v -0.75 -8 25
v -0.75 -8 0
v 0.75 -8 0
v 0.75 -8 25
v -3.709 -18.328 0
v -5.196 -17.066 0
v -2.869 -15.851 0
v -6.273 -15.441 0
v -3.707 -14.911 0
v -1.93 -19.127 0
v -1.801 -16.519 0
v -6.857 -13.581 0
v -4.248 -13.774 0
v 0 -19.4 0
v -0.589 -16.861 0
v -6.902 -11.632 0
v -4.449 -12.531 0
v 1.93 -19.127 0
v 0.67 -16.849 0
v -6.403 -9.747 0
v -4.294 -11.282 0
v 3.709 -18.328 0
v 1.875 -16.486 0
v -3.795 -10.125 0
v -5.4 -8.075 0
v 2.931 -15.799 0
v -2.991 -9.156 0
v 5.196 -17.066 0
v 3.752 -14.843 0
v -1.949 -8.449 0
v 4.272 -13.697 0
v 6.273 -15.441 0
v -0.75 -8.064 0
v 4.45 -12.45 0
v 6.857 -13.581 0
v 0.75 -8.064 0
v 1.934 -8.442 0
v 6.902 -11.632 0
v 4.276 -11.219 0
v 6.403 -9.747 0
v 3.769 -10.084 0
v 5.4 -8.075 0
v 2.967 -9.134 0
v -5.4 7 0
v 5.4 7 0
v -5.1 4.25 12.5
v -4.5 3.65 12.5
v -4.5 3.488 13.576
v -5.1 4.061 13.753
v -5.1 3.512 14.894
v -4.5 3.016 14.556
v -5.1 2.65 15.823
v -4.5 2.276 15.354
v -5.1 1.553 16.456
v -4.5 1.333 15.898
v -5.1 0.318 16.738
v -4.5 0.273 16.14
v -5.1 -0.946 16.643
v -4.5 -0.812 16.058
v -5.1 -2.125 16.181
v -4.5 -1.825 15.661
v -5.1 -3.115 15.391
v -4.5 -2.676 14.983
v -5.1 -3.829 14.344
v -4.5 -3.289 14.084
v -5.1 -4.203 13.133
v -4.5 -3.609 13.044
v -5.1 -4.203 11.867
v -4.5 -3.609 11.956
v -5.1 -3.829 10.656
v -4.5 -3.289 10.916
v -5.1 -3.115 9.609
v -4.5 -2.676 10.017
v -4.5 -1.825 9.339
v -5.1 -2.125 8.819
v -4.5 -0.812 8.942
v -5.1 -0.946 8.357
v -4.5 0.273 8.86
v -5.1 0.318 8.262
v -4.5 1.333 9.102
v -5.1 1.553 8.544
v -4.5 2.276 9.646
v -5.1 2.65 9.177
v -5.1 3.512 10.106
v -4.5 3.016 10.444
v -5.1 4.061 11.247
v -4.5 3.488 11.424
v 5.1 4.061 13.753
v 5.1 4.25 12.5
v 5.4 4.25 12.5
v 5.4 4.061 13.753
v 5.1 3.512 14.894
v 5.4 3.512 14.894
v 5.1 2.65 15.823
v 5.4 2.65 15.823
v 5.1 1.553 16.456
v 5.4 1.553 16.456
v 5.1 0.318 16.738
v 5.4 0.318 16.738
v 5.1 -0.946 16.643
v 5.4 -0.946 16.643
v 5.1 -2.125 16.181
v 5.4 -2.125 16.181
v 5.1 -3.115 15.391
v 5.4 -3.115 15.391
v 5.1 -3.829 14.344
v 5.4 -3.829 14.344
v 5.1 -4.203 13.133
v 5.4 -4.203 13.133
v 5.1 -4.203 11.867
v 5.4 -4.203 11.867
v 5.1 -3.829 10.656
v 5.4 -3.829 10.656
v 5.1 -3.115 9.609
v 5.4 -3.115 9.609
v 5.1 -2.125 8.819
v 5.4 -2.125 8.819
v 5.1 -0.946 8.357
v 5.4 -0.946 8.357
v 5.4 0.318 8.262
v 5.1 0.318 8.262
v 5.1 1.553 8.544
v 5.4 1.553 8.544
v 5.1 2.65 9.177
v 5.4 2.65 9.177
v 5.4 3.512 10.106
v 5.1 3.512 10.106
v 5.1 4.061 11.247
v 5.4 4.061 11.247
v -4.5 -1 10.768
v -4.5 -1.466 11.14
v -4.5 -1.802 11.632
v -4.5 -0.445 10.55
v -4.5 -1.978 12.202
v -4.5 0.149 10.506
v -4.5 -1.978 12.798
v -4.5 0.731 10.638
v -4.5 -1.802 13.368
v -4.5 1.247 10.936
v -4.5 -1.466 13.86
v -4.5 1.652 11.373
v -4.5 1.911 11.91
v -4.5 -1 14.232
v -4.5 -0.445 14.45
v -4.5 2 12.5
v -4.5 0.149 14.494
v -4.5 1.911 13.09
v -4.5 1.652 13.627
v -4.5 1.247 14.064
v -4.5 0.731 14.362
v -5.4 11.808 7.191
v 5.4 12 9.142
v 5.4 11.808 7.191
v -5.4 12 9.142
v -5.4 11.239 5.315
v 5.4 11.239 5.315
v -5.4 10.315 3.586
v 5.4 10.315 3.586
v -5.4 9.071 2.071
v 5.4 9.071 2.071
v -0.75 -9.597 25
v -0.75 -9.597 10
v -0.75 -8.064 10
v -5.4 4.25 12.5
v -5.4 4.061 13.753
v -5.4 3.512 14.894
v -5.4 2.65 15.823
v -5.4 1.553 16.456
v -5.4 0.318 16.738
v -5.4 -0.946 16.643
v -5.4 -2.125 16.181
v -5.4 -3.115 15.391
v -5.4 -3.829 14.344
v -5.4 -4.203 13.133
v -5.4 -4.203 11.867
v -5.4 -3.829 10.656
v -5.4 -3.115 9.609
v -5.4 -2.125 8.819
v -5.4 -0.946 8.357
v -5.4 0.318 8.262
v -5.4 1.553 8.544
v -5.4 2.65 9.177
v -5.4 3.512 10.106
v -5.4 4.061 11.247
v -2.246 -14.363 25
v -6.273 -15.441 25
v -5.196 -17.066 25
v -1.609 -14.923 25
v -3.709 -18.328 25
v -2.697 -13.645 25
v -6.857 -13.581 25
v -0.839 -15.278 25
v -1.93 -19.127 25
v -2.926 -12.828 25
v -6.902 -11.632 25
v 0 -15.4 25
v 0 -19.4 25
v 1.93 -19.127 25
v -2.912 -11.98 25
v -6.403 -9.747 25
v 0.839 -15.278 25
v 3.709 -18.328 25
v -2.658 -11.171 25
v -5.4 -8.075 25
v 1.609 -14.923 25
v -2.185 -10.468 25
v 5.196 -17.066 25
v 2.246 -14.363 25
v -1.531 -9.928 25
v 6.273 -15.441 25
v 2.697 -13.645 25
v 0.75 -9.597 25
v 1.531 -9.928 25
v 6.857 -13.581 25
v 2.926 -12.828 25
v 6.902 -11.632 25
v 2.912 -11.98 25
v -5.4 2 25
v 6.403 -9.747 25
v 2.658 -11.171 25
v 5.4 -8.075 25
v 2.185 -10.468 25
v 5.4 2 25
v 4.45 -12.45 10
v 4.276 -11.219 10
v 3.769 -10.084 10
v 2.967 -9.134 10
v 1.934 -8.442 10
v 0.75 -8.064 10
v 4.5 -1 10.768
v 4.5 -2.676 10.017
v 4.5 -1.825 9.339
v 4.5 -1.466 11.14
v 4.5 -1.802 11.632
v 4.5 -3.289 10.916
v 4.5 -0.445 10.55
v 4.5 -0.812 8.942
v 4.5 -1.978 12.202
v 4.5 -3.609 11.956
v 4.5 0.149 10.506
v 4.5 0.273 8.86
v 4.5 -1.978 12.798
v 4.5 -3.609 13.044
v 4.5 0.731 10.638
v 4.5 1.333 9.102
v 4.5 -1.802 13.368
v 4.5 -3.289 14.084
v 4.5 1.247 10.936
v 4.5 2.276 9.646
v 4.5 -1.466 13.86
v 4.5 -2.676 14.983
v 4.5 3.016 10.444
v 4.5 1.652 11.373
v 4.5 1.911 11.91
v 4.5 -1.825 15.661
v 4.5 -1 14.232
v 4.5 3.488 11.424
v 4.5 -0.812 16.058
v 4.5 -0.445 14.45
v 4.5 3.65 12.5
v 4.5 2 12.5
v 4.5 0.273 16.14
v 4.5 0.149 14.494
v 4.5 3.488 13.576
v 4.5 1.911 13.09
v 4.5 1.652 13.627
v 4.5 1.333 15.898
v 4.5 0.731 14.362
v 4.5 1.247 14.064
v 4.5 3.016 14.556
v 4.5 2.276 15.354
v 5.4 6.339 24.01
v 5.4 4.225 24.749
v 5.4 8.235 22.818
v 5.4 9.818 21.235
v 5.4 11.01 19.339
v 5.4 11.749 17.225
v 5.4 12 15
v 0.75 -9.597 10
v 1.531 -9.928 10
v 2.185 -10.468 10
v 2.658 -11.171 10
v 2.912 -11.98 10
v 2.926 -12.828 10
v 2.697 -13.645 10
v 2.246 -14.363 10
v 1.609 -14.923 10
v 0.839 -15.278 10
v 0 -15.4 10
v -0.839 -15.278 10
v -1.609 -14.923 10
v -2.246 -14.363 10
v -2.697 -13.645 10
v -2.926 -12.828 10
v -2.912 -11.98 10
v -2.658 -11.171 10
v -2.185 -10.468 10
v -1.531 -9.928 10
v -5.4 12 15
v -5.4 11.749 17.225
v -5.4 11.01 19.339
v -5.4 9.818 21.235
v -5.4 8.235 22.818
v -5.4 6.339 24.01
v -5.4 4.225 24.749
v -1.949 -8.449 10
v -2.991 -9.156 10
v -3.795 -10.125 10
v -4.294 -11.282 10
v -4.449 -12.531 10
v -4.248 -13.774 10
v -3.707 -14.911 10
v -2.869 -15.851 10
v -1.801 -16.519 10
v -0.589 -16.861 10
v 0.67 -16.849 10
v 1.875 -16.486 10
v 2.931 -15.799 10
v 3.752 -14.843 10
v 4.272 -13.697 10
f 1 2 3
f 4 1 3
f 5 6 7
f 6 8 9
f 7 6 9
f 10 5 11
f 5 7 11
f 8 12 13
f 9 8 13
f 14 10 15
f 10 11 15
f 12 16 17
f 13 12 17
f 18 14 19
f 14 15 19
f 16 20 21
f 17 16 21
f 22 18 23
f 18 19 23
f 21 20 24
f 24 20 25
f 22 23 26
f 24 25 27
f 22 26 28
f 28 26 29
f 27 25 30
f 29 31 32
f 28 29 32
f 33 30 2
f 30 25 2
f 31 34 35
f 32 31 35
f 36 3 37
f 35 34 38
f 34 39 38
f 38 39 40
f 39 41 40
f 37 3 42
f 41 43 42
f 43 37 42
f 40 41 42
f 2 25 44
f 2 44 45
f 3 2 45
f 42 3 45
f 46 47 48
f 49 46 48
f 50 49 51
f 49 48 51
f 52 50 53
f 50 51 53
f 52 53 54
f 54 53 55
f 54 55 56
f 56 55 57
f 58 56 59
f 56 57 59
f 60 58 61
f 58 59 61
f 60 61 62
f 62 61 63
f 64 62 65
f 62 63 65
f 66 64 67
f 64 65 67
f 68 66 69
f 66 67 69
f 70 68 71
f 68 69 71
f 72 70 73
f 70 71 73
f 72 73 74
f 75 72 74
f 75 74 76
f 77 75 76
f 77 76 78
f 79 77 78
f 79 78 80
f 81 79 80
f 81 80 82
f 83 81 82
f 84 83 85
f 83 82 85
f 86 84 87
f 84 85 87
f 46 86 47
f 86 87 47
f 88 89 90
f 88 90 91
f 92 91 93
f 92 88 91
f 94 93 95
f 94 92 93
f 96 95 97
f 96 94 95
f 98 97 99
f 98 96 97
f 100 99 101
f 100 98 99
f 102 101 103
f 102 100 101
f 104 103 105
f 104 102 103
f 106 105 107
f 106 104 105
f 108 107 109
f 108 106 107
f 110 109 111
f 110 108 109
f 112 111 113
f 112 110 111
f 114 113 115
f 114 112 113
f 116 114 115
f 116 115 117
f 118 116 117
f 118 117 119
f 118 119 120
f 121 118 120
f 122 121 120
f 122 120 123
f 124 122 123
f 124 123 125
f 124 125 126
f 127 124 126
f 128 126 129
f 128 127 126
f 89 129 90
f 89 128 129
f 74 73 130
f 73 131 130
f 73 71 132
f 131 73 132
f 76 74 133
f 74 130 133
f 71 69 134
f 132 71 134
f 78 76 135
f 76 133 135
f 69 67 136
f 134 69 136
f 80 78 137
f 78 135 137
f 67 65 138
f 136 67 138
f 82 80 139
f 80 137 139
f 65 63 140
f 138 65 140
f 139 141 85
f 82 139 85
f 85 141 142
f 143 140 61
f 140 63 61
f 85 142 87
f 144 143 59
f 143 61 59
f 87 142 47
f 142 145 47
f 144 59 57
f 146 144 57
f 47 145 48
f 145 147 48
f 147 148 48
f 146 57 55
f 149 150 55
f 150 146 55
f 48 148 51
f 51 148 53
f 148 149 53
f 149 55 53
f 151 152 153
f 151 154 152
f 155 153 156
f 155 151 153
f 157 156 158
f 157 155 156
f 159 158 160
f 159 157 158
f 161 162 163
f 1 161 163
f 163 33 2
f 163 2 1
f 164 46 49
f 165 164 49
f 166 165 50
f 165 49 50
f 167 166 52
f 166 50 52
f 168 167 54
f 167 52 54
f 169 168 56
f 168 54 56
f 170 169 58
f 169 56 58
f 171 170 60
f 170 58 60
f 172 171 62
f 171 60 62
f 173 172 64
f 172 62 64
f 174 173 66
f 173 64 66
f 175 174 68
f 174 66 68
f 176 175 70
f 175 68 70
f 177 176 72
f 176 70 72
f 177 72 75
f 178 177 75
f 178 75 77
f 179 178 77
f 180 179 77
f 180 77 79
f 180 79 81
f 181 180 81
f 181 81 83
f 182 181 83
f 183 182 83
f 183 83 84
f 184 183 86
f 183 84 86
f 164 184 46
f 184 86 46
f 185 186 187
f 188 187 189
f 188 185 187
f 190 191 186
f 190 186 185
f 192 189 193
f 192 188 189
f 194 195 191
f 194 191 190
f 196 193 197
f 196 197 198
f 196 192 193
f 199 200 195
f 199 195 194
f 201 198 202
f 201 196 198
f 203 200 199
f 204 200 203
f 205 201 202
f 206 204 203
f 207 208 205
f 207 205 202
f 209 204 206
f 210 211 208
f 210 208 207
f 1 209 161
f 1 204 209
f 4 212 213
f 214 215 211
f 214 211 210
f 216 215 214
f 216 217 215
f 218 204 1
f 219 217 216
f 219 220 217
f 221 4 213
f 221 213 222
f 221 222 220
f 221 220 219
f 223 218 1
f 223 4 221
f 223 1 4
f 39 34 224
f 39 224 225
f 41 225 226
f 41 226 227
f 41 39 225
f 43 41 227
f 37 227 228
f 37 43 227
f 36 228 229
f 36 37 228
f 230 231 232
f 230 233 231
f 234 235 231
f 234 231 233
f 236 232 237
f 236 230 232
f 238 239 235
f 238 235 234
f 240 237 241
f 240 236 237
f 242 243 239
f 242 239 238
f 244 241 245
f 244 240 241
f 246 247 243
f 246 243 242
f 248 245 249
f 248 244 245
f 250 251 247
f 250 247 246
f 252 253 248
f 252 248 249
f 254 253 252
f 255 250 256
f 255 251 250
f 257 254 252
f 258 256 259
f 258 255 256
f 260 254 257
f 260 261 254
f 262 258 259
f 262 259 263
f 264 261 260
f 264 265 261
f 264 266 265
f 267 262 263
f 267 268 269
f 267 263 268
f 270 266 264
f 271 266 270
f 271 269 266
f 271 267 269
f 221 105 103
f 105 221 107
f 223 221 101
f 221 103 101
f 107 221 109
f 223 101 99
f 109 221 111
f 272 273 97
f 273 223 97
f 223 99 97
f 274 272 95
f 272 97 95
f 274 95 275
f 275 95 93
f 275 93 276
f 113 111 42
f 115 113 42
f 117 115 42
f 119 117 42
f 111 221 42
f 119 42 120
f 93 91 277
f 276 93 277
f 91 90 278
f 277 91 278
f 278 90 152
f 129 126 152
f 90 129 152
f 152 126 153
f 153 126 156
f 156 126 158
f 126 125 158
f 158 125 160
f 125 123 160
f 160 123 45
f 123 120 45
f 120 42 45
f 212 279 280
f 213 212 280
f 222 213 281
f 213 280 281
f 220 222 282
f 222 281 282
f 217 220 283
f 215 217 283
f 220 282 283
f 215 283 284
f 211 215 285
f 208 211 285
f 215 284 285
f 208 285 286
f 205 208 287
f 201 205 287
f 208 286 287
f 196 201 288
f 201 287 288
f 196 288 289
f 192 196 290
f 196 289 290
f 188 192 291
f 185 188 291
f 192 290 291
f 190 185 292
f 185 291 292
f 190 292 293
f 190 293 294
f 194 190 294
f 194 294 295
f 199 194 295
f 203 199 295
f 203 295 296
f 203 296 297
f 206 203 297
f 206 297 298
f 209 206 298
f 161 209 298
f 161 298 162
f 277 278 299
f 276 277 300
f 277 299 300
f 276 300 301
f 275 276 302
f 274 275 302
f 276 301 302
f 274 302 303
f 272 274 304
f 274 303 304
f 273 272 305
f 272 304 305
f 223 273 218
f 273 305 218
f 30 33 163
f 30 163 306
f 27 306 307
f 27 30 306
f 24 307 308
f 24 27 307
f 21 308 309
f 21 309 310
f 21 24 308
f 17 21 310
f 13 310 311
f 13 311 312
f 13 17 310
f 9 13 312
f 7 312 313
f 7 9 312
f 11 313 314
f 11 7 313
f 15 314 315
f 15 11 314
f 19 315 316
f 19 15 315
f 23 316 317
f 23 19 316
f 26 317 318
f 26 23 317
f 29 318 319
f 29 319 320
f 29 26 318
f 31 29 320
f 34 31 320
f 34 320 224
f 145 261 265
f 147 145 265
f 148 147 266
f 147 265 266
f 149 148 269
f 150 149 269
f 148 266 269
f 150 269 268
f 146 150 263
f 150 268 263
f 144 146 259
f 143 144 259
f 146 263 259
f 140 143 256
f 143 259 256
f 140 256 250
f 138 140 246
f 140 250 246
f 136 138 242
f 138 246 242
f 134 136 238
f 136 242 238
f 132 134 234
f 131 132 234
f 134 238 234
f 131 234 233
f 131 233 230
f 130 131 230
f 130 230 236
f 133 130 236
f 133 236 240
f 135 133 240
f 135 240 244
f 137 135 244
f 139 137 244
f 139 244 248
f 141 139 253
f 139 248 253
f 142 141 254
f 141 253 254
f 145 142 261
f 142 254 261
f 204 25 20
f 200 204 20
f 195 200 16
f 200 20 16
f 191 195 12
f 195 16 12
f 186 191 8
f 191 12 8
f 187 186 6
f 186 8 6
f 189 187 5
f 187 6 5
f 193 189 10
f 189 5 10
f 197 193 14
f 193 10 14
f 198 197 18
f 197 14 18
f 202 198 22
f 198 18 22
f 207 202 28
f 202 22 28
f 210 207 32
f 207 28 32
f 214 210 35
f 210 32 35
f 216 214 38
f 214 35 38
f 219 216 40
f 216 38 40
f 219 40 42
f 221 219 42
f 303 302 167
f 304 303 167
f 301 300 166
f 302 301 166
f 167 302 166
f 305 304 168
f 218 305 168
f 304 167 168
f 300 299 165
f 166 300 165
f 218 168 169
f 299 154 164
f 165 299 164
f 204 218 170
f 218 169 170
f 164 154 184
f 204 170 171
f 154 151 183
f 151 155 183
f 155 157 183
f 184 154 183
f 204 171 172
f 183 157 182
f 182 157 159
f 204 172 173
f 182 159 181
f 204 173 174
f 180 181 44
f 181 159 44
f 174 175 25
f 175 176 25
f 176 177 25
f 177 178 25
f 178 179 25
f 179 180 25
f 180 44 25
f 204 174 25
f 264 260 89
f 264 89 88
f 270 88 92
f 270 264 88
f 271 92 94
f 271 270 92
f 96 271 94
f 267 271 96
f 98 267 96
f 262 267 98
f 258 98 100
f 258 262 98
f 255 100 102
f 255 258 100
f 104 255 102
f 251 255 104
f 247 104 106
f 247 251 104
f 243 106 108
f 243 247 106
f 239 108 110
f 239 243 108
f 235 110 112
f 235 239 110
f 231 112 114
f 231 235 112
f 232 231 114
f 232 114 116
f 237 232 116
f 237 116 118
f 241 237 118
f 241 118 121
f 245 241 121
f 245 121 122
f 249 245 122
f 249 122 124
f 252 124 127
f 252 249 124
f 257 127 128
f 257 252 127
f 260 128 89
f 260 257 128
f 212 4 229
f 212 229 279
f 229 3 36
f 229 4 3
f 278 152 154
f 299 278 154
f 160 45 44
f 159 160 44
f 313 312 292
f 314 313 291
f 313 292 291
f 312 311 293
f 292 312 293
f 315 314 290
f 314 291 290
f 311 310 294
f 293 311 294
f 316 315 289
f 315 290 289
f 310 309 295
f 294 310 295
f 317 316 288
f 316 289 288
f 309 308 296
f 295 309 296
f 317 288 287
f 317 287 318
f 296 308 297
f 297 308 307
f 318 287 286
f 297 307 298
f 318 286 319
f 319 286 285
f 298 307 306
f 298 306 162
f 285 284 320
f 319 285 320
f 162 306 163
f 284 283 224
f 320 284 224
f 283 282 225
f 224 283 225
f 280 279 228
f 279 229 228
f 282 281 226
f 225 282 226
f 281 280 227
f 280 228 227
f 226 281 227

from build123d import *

# Parameters (mm, degrees)
F1_DEPTH = 25
F2_R     = 10
F3_R     = 2
F4_DEPTH = 12.5
F5_SIZE  = 5
F6_DEPTH = 10
F7_START = -4.5
F3_R_2   = 4.25
F7_DEPTH = 0.9
F8_START = 4.5
F8_DEPTH = 0.9
F9_SIZE  = 0.6
F10_R    = 10


with BuildPart() as f1:
    # F0 (on Top) → F1 (new body)
    with BuildSketch(Plane.XY):
        with BuildLine():
            Line((5.4, 12), (-5.4, 12))
            Line((-5.4, 12), (-5.4, 2))
            Line((-5.4, 2), (-5.4, -2))
            Line((-5.4, -2), (-5.4, -8.0747857195))
            ThreePointArc((-5.4, -8.0747857195), (0, -19.4), (5.4, -8.0747857195))
            Line((5.4, -8.0747857195), (5.4, -2))
            Line((5.4, -2), (5.4, 2))
            Line((5.4, 2), (5.4, 12))
        make_face()
        with BuildLine():
            ThreePointArc((4.45, -12.45), (-2.8692333471, -15.8514702703), (-0.75, -8.0636575601))
            Line((-0.75, -8.0636575601), (-0.75, -8))
            Line((-0.75, -8), (0, -8))
            Line((0, -8), (0.75, -8))
            Line((0.75, -8), (0.75, -8.0636575601))
            ThreePointArc((0.75, -8.0636575601), (3.4014702703, -9.5807666529), (4.45, -12.45))
        make_face(mode=Mode.SUBTRACT)
        with BuildLine():
            ThreePointArc((0.75, -9.5969314765), (0, -15.4), (-0.75, -9.5969314765))
            Line((-0.75, -9.5969314765), (-0.75, -8.0636575601))
            ThreePointArc((-0.75, -8.0636575601), (-2.8692333471, -15.8514702703), (4.45, -12.45))
            ThreePointArc((4.45, -12.45), (3.4014702703, -9.5807666529), (0.75, -8.0636575601))
            Line((0.75, -8.0636575601), (0.75, -9.5969314765))
        make_face()
    extrude(amount=F1_DEPTH)

    # F2
    f2_edges = [f1.edges().sort_by_distance(p)[0] for p in [
        (0, 12, 25),
    ]]
    fillet(f2_edges, radius=F2_R)

    # F3 (on Right) → F4 (cut, symmetric)
    with BuildSketch(Plane.YZ):
        with Locations((0, 12.5)):
            Circle(F3_R)
    extrude(amount=F4_DEPTH, both=True, mode=Mode.SUBTRACT)

    # F5
    f5_edges = [f1.edges().sort_by_distance(p)[0] for p in [
        (0, 12, 0),
    ]]
    chamfer(f5_edges, length=F5_SIZE)

    # F0 (on Top) → F6 (cut)
    with BuildSketch(Plane.XY):
        with BuildLine():
            ThreePointArc((0.75, -9.5969314765), (0, -15.4), (-0.75, -9.5969314765))
            Line((-0.75, -9.5969314765), (-0.75, -8.0636575601))
            ThreePointArc((-0.75, -8.0636575601), (-2.8692333471, -15.8514702703), (4.45, -12.45))
            ThreePointArc((4.45, -12.45), (3.4014702703, -9.5807666529), (0.75, -8.0636575601))
            Line((0.75, -8.0636575601), (0.75, -9.5969314765))
        make_face()
    extrude(amount=F6_DEPTH, mode=Mode.SUBTRACT)

    # F3 (on Right) → F7 (cut)
    with BuildSketch(Plane.YZ.offset(F7_START)):
        with Locations((0, 12.5)):
            Circle(F3_R_2)
        with Locations((0, 12.5)):
            Circle(F3_R, mode=Mode.SUBTRACT)
    extrude(amount=-F7_DEPTH, mode=Mode.SUBTRACT)

    # F3 (on Right) → F8 (cut)
    with BuildSketch(Plane.YZ.offset(F8_START)):
        with Locations((0, 12.5)):
            Circle(F3_R_2)
        with Locations((0, 12.5)):
            Circle(F3_R, mode=Mode.SUBTRACT)
    extrude(amount=F8_DEPTH, mode=Mode.SUBTRACT)

    # F9
    f9_edges = [f1.edges().sort_by_distance(p)[0] for p in [
        (4.5, -4.25, 12.5),
        (-4.5, -4.25, 12.5),
    ]]
    chamfer(f9_edges, length=F9_SIZE)

    # F10
    f10_edges = [f1.edges().sort_by_distance(p)[0] for p in [
        (0, 12, 5),
    ]]
    fillet(f10_edges, radius=F10_R)


solid = f1.part
